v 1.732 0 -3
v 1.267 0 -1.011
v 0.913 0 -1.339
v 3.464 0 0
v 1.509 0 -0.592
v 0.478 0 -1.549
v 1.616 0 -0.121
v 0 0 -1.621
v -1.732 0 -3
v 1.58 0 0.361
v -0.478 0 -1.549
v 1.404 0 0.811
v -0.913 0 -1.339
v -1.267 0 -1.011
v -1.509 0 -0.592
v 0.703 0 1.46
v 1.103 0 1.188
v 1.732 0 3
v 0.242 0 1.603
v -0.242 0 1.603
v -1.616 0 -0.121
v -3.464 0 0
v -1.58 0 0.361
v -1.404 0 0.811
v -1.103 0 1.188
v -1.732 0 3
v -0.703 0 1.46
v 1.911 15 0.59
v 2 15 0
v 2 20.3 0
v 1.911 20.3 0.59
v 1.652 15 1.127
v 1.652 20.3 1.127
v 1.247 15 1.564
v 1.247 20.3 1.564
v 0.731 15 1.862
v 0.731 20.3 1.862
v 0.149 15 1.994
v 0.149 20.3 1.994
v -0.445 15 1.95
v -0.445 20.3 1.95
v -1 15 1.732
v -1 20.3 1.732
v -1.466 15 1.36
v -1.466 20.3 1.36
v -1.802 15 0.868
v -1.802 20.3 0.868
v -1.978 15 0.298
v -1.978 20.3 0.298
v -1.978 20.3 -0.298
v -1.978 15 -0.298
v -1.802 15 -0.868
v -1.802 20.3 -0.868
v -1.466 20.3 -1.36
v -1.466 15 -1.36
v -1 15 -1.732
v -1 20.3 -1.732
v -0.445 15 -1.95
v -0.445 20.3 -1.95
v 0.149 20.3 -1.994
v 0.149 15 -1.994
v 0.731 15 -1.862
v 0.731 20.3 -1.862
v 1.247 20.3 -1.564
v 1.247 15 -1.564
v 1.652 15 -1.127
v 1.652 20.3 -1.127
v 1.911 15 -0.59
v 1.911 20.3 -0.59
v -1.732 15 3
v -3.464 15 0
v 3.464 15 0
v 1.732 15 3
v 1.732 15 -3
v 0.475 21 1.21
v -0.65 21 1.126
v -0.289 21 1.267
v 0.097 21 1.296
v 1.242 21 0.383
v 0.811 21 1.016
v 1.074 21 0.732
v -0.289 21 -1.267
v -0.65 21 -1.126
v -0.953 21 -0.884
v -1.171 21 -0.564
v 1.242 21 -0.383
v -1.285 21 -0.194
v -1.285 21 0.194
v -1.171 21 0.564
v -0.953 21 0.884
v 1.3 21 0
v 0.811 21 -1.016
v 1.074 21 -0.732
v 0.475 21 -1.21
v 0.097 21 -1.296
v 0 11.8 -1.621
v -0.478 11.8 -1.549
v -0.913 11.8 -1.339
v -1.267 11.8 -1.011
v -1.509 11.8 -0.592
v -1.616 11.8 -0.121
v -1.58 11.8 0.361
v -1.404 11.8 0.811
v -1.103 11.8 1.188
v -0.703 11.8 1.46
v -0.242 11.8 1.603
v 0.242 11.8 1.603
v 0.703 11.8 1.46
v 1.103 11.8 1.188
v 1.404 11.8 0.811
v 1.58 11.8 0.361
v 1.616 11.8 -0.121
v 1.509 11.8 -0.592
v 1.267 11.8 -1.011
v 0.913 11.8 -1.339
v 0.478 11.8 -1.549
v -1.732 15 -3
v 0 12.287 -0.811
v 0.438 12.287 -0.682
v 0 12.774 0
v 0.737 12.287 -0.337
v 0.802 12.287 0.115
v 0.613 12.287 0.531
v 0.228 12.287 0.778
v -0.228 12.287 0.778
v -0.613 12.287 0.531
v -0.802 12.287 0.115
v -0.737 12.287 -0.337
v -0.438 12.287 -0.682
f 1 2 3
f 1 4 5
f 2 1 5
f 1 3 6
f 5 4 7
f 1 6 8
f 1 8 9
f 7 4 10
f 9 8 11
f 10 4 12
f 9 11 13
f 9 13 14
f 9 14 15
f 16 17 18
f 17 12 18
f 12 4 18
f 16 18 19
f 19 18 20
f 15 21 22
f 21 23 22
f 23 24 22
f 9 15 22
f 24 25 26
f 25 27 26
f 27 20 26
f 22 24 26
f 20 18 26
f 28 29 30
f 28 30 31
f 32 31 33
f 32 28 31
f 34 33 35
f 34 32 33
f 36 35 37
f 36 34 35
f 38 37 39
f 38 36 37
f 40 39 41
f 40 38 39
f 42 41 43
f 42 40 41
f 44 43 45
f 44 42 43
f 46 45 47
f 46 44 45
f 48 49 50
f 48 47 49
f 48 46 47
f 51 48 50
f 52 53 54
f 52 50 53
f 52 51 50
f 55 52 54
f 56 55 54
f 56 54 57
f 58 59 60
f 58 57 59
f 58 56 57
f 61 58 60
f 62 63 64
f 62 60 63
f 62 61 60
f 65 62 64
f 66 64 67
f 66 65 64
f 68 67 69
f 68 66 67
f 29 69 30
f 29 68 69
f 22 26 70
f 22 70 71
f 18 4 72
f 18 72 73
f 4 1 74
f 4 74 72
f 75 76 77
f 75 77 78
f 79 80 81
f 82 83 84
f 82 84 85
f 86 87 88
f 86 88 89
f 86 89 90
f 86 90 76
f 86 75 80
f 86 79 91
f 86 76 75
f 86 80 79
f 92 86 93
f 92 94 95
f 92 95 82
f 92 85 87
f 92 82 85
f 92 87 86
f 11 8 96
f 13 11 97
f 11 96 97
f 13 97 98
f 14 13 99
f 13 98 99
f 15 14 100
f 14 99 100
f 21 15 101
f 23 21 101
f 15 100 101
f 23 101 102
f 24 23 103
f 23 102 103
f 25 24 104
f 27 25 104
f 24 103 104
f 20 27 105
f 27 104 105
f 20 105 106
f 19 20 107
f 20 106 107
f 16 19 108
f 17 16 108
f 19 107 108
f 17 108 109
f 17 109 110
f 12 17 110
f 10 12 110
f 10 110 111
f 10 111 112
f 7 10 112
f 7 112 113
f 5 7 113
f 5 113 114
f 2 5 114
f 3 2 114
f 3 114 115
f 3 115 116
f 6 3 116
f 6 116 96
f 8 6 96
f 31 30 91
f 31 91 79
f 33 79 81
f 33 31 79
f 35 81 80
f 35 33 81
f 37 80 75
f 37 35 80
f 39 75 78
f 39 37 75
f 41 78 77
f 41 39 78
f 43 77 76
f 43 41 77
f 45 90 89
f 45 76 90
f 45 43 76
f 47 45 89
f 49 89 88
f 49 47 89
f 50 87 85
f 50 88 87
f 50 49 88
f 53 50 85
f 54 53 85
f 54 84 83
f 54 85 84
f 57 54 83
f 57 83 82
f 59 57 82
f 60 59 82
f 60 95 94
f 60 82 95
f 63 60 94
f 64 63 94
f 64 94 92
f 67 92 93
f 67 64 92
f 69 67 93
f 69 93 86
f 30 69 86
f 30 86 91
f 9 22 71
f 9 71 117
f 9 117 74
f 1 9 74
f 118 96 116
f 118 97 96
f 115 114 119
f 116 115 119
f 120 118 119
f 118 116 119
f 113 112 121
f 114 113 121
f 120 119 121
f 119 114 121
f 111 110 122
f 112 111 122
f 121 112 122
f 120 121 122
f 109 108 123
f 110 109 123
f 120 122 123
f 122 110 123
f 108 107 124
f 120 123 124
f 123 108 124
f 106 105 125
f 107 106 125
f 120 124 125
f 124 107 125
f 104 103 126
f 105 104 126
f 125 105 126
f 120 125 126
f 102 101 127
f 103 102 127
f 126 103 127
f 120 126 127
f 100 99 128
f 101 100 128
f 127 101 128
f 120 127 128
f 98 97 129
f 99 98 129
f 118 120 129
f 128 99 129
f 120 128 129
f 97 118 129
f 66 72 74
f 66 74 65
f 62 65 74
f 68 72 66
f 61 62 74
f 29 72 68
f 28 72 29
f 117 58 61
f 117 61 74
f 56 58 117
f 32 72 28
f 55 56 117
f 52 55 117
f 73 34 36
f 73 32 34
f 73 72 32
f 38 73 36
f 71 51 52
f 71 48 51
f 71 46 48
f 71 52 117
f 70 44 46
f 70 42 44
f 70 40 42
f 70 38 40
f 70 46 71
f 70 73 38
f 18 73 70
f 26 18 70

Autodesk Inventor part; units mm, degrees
ref_plane "YZ Plane" through (0, 0, 0) normal (1, 0, 0) x (0, 1, 0)
ref_plane "XZ Plane" through (0, 0, 0) normal (0, 1, 0) x (-1, 0, 0)
ref_plane "XY Plane" through (0, 0, 0) normal (0, 0, 1) x (1, 0, 0)
sketch "Sketch1" plane through (0, 0, 0) normal (0, 1, 0) x (-1, 0, 0)
  line L0 (-1.7321, -3) -> (-3.4641, 0)
  line L1 (-3.4641, 0) -> (-1.7321, 3)
  line L2 (-1.7321, 3) -> (1.7321, 3)
  line L3 (1.7321, 3) -> (3.4641, 0)
  line L4 (3.4641, 0) -> (1.7321, -3)
  line L5 (1.7321, -3) -> (-1.7321, -3)
  point P0 (0, 0)
  point P1 (0, 0)
  point P2 (0, 0)
  dimension "d0" = 3
extrude "Extrusion1" add sketch "Sketch1" along normal blind 15
hole "Hole2" at (0, 0, 0) direction (0, 1, 0) diameter 3.242 depth 11.8 tip angle 118 thread size "M4x0.7" class "6H" standard "ISO Metric profile"
sketch "Sketch3" plane through (0, 15, 0) normal (0, 1, 0) x (1, 0, 0)
  circle A0 centre (0, 0) radius 2
  dimension "d17" = 4
extrude "Extrusion2" add sketch "Sketch3" along normal blind 6
thread "Thread1" size "M4x0.7" class "6g" standard "ANSI Metric M Profile" length 5
chamfer "Chamfer1" distance 0.7 angle 45 1 edges at (-2, 21, 0)
properties part number "StandoffM4x15B" material "Brass, Soft Yellow"
